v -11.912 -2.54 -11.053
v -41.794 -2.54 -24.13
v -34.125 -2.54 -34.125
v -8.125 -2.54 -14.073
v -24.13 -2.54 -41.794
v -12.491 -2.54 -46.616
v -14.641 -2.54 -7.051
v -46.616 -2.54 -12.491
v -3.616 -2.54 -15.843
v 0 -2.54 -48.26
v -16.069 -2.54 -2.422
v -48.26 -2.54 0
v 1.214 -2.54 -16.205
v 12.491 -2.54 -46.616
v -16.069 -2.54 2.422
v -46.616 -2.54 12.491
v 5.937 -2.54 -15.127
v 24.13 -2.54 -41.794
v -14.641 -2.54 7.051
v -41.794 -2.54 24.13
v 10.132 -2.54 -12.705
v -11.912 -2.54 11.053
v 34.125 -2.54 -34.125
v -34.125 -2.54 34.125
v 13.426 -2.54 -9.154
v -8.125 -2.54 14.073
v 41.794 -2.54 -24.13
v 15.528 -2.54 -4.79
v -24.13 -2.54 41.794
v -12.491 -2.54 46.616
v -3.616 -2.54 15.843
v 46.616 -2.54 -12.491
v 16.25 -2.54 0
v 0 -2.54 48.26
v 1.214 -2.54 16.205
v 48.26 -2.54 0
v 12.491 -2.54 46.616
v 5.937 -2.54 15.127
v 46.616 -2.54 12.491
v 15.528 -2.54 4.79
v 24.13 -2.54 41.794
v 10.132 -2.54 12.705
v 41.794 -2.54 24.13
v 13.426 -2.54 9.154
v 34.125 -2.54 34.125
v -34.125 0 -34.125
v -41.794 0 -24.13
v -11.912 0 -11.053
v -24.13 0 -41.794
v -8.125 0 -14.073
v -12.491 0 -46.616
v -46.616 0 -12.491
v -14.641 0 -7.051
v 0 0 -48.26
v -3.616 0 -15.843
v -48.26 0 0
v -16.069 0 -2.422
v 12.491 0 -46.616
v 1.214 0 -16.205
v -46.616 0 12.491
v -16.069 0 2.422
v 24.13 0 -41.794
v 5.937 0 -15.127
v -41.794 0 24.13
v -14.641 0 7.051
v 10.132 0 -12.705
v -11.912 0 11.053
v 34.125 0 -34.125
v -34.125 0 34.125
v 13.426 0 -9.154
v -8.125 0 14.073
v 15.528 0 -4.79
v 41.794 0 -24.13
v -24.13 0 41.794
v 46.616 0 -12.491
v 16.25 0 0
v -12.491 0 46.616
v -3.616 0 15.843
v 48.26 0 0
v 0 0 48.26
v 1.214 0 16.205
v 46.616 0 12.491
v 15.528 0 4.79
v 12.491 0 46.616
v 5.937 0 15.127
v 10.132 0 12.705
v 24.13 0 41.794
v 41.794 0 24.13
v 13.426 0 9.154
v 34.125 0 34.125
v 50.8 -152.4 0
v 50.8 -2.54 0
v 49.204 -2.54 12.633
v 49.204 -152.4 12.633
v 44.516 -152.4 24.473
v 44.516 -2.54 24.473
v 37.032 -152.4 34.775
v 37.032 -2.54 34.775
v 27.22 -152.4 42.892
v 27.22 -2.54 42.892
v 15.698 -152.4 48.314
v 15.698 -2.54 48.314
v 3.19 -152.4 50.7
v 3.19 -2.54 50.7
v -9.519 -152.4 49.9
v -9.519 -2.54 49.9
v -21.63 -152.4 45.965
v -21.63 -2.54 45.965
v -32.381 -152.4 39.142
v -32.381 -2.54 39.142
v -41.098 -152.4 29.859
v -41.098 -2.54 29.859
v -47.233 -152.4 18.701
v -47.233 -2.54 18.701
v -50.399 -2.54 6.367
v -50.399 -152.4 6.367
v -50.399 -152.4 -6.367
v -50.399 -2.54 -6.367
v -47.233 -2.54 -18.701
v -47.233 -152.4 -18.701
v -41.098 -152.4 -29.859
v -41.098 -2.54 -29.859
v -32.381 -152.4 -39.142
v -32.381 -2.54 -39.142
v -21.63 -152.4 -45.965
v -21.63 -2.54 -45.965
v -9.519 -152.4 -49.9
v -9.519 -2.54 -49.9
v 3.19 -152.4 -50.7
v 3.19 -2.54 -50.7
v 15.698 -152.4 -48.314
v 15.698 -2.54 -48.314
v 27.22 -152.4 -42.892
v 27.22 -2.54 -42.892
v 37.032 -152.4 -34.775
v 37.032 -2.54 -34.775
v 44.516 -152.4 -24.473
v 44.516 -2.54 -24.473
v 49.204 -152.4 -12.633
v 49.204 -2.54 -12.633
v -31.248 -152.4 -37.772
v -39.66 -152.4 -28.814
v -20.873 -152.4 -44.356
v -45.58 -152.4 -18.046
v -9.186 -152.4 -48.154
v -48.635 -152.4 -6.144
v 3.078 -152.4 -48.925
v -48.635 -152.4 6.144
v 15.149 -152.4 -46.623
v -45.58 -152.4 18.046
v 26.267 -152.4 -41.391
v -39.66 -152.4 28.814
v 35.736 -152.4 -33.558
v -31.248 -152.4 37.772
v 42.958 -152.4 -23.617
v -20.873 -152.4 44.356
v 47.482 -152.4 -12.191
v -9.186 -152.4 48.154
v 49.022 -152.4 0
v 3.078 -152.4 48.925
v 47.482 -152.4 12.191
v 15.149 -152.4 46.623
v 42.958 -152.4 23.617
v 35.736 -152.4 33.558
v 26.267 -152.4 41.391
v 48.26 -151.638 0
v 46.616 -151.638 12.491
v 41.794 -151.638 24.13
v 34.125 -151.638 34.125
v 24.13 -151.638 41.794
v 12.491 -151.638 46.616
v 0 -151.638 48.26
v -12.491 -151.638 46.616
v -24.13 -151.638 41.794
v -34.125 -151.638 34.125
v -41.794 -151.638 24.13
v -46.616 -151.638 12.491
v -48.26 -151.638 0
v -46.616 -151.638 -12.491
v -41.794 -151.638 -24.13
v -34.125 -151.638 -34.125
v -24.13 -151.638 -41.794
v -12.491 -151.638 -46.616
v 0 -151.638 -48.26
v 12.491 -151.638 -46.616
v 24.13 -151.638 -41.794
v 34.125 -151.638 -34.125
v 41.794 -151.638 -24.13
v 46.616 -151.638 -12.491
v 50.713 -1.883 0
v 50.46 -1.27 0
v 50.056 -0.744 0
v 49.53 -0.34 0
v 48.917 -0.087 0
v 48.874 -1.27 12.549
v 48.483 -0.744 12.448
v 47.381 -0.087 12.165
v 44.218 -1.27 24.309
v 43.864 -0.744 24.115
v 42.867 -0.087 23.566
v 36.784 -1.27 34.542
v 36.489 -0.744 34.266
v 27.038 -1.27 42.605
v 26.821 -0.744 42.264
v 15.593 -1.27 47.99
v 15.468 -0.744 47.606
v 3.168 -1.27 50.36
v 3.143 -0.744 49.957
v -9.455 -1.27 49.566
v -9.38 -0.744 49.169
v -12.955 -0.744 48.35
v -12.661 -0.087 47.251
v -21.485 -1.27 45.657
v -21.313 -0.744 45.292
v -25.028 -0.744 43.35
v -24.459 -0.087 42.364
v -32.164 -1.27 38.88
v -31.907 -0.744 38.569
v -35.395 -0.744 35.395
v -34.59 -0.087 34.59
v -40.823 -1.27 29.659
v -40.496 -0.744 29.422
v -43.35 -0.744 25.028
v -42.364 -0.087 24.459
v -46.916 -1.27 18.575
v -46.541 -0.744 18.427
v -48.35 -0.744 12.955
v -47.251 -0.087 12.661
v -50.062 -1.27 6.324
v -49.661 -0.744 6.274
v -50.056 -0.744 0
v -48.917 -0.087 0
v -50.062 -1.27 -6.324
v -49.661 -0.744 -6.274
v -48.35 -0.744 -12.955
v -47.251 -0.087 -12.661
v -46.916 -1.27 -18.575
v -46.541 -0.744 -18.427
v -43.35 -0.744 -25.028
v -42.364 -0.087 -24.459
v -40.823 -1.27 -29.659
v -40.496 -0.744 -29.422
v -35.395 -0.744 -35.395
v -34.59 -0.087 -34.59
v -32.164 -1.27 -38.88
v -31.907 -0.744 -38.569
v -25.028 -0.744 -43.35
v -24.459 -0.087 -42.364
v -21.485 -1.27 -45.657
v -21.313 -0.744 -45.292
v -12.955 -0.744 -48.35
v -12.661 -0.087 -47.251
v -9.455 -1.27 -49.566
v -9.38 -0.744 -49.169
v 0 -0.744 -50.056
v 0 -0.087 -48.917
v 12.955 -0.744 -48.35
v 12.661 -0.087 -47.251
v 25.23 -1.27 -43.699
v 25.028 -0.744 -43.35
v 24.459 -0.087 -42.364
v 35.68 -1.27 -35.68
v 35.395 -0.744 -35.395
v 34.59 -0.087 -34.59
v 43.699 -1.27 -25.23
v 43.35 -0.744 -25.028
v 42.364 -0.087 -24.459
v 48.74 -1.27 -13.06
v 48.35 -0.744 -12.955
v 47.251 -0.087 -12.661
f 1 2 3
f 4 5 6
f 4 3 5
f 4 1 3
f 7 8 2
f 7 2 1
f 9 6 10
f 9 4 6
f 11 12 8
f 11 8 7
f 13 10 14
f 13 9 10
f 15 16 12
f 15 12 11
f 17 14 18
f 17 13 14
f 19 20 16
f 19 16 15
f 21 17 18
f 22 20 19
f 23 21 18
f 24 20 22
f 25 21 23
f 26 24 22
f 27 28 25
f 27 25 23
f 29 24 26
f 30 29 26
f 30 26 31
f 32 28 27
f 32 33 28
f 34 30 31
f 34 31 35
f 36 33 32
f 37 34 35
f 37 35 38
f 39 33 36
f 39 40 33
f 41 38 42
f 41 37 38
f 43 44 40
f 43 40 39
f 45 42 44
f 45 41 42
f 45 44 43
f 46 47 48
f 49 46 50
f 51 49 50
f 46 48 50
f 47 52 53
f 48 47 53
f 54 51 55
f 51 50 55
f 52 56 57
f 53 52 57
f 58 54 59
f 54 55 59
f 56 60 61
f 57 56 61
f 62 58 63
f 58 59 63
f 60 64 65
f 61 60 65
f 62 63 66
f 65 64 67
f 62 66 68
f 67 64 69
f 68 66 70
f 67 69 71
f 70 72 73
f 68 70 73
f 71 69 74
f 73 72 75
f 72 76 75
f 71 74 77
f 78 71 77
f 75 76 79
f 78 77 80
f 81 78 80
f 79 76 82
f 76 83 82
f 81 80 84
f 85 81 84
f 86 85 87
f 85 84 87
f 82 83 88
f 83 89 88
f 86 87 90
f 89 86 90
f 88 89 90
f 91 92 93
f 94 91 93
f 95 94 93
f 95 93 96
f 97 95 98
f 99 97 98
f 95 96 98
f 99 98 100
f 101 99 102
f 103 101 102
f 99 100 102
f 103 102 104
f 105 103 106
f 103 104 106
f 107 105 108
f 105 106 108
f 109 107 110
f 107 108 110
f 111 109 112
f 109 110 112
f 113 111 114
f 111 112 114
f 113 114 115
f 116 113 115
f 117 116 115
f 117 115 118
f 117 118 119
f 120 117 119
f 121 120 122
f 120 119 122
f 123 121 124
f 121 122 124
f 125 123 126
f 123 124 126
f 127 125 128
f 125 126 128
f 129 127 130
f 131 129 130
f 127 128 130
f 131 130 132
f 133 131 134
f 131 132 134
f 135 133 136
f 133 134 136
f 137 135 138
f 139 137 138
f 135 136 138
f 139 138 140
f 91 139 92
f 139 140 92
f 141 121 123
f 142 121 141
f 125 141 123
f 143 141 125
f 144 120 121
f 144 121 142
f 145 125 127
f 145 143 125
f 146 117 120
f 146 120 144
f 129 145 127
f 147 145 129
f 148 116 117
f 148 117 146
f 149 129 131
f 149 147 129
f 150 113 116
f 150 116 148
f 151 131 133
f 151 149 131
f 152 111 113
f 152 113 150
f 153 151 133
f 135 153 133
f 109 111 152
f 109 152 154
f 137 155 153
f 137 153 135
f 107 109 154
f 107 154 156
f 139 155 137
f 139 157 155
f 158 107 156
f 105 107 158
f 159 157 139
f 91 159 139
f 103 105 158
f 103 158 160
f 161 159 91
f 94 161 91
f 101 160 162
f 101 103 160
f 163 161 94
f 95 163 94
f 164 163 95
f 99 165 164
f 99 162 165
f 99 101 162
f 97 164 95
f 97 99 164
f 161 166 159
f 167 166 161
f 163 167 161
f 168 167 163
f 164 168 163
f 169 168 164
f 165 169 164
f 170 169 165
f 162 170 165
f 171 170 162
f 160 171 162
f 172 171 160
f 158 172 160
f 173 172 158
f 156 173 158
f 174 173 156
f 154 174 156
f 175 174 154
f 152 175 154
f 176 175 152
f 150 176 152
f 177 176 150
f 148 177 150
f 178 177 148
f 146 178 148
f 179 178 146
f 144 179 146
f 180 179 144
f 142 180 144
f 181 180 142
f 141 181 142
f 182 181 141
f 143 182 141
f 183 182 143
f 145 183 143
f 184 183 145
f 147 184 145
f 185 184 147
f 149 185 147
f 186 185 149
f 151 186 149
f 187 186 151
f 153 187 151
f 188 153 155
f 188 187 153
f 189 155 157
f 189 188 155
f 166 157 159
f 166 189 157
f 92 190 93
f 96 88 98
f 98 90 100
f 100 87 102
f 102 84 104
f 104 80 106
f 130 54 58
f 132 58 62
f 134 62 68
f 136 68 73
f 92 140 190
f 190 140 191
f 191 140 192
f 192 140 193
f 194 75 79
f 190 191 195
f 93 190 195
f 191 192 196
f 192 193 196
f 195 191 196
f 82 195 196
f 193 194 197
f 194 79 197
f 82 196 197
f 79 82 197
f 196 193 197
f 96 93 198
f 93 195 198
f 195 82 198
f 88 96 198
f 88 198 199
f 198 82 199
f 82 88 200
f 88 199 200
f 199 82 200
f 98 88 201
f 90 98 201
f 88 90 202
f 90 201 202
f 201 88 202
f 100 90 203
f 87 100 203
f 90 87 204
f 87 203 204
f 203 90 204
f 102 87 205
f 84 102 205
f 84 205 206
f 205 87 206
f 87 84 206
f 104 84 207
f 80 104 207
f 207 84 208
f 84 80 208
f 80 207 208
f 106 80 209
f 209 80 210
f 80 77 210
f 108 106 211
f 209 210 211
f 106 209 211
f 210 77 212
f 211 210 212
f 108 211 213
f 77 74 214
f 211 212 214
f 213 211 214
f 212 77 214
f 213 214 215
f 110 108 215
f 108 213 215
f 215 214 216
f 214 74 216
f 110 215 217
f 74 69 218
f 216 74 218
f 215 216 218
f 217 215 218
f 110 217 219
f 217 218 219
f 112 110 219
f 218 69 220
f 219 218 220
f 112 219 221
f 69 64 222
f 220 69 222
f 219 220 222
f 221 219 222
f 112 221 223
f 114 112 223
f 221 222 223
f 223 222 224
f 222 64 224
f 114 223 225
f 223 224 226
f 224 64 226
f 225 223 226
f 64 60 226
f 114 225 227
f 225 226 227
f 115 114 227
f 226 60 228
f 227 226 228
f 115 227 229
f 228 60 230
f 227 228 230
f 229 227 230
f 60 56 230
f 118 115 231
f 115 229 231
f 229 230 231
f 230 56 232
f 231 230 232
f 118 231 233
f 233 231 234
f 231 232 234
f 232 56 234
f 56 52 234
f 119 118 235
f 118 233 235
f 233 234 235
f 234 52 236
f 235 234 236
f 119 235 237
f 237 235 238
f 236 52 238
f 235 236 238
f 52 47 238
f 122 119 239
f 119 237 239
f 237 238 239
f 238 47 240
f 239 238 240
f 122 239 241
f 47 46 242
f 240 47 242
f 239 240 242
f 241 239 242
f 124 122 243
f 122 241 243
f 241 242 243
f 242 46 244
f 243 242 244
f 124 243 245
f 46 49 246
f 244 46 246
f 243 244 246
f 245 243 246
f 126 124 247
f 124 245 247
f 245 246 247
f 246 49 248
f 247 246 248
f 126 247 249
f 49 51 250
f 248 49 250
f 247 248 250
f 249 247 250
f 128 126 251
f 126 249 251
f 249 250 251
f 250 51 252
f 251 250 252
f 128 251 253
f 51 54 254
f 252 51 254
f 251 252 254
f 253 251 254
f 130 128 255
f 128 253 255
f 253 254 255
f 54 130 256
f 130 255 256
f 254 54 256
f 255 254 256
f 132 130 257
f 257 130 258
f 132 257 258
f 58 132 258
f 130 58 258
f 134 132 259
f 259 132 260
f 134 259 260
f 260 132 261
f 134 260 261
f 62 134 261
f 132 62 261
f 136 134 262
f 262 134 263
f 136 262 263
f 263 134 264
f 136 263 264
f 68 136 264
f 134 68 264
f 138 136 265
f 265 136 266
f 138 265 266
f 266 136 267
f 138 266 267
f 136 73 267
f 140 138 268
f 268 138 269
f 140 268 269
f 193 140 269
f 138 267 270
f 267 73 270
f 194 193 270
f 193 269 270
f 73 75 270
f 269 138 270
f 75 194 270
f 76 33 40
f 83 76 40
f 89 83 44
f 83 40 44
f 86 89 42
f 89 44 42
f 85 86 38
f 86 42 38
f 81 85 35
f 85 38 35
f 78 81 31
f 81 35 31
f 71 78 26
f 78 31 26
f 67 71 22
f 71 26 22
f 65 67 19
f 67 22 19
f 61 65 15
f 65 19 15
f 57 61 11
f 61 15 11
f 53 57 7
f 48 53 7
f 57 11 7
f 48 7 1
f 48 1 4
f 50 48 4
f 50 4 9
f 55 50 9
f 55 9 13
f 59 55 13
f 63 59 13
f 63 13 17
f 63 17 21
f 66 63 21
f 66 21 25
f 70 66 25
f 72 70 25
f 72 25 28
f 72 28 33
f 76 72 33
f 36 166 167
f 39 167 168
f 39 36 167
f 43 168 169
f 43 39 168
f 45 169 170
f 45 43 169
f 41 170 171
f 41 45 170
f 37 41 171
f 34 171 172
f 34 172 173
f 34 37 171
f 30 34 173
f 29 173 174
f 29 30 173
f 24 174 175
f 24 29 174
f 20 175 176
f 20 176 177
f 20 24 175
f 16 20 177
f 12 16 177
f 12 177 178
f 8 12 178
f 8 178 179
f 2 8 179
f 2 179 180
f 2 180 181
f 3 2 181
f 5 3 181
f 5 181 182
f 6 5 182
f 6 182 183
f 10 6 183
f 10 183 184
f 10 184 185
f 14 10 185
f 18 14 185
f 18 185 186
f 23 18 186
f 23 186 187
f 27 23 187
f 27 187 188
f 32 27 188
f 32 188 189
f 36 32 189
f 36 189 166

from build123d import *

# Parameters (mm, degrees)
F0_R          = 50.8
F1_DEPTH      = 152.4
F2_T          = -2.54
F3_R          = 16.25
F4_DEPTH      = 25.4
F4_DEPTH_BACK = 25.4
F5_SIZE       = 0.762
F6_R          = 2.54


with BuildPart() as f1:
    # F0 (on Front) → F1 (new body)
    with BuildSketch(Plane.XZ):
        Circle(F0_R)
    extrude(amount=F1_DEPTH)

    # F2
    f2_openings = [f1.faces().sort_by_distance(p)[0] for p in [
        (0, -152.4, 0),
    ]]
    offset(amount=F2_T, openings=f2_openings)

    # F3 (on face) → F4 (cut, two sides)
    with BuildSketch(Plane.XZ.offset(2.54)) as f4_sk:
        Circle(F3_R)
    extrude(amount=-F4_DEPTH, mode=Mode.SUBTRACT)
    extrude(f4_sk.sketch, amount=F4_DEPTH_BACK, mode=Mode.SUBTRACT)

    # F5
    f5_edges = [f1.edges().sort_by_distance(p)[0] for p in [
        (-48.26, -152.4, 0),
    ]]
    chamfer(f5_edges, length=F5_SIZE)

    # F6
    f6_edges = [f1.edges().sort_by_distance(p)[0] for p in [
        (-50.8, 0, 0),
    ]]
    fillet(f6_edges, radius=F6_R)


solid = f1.part
